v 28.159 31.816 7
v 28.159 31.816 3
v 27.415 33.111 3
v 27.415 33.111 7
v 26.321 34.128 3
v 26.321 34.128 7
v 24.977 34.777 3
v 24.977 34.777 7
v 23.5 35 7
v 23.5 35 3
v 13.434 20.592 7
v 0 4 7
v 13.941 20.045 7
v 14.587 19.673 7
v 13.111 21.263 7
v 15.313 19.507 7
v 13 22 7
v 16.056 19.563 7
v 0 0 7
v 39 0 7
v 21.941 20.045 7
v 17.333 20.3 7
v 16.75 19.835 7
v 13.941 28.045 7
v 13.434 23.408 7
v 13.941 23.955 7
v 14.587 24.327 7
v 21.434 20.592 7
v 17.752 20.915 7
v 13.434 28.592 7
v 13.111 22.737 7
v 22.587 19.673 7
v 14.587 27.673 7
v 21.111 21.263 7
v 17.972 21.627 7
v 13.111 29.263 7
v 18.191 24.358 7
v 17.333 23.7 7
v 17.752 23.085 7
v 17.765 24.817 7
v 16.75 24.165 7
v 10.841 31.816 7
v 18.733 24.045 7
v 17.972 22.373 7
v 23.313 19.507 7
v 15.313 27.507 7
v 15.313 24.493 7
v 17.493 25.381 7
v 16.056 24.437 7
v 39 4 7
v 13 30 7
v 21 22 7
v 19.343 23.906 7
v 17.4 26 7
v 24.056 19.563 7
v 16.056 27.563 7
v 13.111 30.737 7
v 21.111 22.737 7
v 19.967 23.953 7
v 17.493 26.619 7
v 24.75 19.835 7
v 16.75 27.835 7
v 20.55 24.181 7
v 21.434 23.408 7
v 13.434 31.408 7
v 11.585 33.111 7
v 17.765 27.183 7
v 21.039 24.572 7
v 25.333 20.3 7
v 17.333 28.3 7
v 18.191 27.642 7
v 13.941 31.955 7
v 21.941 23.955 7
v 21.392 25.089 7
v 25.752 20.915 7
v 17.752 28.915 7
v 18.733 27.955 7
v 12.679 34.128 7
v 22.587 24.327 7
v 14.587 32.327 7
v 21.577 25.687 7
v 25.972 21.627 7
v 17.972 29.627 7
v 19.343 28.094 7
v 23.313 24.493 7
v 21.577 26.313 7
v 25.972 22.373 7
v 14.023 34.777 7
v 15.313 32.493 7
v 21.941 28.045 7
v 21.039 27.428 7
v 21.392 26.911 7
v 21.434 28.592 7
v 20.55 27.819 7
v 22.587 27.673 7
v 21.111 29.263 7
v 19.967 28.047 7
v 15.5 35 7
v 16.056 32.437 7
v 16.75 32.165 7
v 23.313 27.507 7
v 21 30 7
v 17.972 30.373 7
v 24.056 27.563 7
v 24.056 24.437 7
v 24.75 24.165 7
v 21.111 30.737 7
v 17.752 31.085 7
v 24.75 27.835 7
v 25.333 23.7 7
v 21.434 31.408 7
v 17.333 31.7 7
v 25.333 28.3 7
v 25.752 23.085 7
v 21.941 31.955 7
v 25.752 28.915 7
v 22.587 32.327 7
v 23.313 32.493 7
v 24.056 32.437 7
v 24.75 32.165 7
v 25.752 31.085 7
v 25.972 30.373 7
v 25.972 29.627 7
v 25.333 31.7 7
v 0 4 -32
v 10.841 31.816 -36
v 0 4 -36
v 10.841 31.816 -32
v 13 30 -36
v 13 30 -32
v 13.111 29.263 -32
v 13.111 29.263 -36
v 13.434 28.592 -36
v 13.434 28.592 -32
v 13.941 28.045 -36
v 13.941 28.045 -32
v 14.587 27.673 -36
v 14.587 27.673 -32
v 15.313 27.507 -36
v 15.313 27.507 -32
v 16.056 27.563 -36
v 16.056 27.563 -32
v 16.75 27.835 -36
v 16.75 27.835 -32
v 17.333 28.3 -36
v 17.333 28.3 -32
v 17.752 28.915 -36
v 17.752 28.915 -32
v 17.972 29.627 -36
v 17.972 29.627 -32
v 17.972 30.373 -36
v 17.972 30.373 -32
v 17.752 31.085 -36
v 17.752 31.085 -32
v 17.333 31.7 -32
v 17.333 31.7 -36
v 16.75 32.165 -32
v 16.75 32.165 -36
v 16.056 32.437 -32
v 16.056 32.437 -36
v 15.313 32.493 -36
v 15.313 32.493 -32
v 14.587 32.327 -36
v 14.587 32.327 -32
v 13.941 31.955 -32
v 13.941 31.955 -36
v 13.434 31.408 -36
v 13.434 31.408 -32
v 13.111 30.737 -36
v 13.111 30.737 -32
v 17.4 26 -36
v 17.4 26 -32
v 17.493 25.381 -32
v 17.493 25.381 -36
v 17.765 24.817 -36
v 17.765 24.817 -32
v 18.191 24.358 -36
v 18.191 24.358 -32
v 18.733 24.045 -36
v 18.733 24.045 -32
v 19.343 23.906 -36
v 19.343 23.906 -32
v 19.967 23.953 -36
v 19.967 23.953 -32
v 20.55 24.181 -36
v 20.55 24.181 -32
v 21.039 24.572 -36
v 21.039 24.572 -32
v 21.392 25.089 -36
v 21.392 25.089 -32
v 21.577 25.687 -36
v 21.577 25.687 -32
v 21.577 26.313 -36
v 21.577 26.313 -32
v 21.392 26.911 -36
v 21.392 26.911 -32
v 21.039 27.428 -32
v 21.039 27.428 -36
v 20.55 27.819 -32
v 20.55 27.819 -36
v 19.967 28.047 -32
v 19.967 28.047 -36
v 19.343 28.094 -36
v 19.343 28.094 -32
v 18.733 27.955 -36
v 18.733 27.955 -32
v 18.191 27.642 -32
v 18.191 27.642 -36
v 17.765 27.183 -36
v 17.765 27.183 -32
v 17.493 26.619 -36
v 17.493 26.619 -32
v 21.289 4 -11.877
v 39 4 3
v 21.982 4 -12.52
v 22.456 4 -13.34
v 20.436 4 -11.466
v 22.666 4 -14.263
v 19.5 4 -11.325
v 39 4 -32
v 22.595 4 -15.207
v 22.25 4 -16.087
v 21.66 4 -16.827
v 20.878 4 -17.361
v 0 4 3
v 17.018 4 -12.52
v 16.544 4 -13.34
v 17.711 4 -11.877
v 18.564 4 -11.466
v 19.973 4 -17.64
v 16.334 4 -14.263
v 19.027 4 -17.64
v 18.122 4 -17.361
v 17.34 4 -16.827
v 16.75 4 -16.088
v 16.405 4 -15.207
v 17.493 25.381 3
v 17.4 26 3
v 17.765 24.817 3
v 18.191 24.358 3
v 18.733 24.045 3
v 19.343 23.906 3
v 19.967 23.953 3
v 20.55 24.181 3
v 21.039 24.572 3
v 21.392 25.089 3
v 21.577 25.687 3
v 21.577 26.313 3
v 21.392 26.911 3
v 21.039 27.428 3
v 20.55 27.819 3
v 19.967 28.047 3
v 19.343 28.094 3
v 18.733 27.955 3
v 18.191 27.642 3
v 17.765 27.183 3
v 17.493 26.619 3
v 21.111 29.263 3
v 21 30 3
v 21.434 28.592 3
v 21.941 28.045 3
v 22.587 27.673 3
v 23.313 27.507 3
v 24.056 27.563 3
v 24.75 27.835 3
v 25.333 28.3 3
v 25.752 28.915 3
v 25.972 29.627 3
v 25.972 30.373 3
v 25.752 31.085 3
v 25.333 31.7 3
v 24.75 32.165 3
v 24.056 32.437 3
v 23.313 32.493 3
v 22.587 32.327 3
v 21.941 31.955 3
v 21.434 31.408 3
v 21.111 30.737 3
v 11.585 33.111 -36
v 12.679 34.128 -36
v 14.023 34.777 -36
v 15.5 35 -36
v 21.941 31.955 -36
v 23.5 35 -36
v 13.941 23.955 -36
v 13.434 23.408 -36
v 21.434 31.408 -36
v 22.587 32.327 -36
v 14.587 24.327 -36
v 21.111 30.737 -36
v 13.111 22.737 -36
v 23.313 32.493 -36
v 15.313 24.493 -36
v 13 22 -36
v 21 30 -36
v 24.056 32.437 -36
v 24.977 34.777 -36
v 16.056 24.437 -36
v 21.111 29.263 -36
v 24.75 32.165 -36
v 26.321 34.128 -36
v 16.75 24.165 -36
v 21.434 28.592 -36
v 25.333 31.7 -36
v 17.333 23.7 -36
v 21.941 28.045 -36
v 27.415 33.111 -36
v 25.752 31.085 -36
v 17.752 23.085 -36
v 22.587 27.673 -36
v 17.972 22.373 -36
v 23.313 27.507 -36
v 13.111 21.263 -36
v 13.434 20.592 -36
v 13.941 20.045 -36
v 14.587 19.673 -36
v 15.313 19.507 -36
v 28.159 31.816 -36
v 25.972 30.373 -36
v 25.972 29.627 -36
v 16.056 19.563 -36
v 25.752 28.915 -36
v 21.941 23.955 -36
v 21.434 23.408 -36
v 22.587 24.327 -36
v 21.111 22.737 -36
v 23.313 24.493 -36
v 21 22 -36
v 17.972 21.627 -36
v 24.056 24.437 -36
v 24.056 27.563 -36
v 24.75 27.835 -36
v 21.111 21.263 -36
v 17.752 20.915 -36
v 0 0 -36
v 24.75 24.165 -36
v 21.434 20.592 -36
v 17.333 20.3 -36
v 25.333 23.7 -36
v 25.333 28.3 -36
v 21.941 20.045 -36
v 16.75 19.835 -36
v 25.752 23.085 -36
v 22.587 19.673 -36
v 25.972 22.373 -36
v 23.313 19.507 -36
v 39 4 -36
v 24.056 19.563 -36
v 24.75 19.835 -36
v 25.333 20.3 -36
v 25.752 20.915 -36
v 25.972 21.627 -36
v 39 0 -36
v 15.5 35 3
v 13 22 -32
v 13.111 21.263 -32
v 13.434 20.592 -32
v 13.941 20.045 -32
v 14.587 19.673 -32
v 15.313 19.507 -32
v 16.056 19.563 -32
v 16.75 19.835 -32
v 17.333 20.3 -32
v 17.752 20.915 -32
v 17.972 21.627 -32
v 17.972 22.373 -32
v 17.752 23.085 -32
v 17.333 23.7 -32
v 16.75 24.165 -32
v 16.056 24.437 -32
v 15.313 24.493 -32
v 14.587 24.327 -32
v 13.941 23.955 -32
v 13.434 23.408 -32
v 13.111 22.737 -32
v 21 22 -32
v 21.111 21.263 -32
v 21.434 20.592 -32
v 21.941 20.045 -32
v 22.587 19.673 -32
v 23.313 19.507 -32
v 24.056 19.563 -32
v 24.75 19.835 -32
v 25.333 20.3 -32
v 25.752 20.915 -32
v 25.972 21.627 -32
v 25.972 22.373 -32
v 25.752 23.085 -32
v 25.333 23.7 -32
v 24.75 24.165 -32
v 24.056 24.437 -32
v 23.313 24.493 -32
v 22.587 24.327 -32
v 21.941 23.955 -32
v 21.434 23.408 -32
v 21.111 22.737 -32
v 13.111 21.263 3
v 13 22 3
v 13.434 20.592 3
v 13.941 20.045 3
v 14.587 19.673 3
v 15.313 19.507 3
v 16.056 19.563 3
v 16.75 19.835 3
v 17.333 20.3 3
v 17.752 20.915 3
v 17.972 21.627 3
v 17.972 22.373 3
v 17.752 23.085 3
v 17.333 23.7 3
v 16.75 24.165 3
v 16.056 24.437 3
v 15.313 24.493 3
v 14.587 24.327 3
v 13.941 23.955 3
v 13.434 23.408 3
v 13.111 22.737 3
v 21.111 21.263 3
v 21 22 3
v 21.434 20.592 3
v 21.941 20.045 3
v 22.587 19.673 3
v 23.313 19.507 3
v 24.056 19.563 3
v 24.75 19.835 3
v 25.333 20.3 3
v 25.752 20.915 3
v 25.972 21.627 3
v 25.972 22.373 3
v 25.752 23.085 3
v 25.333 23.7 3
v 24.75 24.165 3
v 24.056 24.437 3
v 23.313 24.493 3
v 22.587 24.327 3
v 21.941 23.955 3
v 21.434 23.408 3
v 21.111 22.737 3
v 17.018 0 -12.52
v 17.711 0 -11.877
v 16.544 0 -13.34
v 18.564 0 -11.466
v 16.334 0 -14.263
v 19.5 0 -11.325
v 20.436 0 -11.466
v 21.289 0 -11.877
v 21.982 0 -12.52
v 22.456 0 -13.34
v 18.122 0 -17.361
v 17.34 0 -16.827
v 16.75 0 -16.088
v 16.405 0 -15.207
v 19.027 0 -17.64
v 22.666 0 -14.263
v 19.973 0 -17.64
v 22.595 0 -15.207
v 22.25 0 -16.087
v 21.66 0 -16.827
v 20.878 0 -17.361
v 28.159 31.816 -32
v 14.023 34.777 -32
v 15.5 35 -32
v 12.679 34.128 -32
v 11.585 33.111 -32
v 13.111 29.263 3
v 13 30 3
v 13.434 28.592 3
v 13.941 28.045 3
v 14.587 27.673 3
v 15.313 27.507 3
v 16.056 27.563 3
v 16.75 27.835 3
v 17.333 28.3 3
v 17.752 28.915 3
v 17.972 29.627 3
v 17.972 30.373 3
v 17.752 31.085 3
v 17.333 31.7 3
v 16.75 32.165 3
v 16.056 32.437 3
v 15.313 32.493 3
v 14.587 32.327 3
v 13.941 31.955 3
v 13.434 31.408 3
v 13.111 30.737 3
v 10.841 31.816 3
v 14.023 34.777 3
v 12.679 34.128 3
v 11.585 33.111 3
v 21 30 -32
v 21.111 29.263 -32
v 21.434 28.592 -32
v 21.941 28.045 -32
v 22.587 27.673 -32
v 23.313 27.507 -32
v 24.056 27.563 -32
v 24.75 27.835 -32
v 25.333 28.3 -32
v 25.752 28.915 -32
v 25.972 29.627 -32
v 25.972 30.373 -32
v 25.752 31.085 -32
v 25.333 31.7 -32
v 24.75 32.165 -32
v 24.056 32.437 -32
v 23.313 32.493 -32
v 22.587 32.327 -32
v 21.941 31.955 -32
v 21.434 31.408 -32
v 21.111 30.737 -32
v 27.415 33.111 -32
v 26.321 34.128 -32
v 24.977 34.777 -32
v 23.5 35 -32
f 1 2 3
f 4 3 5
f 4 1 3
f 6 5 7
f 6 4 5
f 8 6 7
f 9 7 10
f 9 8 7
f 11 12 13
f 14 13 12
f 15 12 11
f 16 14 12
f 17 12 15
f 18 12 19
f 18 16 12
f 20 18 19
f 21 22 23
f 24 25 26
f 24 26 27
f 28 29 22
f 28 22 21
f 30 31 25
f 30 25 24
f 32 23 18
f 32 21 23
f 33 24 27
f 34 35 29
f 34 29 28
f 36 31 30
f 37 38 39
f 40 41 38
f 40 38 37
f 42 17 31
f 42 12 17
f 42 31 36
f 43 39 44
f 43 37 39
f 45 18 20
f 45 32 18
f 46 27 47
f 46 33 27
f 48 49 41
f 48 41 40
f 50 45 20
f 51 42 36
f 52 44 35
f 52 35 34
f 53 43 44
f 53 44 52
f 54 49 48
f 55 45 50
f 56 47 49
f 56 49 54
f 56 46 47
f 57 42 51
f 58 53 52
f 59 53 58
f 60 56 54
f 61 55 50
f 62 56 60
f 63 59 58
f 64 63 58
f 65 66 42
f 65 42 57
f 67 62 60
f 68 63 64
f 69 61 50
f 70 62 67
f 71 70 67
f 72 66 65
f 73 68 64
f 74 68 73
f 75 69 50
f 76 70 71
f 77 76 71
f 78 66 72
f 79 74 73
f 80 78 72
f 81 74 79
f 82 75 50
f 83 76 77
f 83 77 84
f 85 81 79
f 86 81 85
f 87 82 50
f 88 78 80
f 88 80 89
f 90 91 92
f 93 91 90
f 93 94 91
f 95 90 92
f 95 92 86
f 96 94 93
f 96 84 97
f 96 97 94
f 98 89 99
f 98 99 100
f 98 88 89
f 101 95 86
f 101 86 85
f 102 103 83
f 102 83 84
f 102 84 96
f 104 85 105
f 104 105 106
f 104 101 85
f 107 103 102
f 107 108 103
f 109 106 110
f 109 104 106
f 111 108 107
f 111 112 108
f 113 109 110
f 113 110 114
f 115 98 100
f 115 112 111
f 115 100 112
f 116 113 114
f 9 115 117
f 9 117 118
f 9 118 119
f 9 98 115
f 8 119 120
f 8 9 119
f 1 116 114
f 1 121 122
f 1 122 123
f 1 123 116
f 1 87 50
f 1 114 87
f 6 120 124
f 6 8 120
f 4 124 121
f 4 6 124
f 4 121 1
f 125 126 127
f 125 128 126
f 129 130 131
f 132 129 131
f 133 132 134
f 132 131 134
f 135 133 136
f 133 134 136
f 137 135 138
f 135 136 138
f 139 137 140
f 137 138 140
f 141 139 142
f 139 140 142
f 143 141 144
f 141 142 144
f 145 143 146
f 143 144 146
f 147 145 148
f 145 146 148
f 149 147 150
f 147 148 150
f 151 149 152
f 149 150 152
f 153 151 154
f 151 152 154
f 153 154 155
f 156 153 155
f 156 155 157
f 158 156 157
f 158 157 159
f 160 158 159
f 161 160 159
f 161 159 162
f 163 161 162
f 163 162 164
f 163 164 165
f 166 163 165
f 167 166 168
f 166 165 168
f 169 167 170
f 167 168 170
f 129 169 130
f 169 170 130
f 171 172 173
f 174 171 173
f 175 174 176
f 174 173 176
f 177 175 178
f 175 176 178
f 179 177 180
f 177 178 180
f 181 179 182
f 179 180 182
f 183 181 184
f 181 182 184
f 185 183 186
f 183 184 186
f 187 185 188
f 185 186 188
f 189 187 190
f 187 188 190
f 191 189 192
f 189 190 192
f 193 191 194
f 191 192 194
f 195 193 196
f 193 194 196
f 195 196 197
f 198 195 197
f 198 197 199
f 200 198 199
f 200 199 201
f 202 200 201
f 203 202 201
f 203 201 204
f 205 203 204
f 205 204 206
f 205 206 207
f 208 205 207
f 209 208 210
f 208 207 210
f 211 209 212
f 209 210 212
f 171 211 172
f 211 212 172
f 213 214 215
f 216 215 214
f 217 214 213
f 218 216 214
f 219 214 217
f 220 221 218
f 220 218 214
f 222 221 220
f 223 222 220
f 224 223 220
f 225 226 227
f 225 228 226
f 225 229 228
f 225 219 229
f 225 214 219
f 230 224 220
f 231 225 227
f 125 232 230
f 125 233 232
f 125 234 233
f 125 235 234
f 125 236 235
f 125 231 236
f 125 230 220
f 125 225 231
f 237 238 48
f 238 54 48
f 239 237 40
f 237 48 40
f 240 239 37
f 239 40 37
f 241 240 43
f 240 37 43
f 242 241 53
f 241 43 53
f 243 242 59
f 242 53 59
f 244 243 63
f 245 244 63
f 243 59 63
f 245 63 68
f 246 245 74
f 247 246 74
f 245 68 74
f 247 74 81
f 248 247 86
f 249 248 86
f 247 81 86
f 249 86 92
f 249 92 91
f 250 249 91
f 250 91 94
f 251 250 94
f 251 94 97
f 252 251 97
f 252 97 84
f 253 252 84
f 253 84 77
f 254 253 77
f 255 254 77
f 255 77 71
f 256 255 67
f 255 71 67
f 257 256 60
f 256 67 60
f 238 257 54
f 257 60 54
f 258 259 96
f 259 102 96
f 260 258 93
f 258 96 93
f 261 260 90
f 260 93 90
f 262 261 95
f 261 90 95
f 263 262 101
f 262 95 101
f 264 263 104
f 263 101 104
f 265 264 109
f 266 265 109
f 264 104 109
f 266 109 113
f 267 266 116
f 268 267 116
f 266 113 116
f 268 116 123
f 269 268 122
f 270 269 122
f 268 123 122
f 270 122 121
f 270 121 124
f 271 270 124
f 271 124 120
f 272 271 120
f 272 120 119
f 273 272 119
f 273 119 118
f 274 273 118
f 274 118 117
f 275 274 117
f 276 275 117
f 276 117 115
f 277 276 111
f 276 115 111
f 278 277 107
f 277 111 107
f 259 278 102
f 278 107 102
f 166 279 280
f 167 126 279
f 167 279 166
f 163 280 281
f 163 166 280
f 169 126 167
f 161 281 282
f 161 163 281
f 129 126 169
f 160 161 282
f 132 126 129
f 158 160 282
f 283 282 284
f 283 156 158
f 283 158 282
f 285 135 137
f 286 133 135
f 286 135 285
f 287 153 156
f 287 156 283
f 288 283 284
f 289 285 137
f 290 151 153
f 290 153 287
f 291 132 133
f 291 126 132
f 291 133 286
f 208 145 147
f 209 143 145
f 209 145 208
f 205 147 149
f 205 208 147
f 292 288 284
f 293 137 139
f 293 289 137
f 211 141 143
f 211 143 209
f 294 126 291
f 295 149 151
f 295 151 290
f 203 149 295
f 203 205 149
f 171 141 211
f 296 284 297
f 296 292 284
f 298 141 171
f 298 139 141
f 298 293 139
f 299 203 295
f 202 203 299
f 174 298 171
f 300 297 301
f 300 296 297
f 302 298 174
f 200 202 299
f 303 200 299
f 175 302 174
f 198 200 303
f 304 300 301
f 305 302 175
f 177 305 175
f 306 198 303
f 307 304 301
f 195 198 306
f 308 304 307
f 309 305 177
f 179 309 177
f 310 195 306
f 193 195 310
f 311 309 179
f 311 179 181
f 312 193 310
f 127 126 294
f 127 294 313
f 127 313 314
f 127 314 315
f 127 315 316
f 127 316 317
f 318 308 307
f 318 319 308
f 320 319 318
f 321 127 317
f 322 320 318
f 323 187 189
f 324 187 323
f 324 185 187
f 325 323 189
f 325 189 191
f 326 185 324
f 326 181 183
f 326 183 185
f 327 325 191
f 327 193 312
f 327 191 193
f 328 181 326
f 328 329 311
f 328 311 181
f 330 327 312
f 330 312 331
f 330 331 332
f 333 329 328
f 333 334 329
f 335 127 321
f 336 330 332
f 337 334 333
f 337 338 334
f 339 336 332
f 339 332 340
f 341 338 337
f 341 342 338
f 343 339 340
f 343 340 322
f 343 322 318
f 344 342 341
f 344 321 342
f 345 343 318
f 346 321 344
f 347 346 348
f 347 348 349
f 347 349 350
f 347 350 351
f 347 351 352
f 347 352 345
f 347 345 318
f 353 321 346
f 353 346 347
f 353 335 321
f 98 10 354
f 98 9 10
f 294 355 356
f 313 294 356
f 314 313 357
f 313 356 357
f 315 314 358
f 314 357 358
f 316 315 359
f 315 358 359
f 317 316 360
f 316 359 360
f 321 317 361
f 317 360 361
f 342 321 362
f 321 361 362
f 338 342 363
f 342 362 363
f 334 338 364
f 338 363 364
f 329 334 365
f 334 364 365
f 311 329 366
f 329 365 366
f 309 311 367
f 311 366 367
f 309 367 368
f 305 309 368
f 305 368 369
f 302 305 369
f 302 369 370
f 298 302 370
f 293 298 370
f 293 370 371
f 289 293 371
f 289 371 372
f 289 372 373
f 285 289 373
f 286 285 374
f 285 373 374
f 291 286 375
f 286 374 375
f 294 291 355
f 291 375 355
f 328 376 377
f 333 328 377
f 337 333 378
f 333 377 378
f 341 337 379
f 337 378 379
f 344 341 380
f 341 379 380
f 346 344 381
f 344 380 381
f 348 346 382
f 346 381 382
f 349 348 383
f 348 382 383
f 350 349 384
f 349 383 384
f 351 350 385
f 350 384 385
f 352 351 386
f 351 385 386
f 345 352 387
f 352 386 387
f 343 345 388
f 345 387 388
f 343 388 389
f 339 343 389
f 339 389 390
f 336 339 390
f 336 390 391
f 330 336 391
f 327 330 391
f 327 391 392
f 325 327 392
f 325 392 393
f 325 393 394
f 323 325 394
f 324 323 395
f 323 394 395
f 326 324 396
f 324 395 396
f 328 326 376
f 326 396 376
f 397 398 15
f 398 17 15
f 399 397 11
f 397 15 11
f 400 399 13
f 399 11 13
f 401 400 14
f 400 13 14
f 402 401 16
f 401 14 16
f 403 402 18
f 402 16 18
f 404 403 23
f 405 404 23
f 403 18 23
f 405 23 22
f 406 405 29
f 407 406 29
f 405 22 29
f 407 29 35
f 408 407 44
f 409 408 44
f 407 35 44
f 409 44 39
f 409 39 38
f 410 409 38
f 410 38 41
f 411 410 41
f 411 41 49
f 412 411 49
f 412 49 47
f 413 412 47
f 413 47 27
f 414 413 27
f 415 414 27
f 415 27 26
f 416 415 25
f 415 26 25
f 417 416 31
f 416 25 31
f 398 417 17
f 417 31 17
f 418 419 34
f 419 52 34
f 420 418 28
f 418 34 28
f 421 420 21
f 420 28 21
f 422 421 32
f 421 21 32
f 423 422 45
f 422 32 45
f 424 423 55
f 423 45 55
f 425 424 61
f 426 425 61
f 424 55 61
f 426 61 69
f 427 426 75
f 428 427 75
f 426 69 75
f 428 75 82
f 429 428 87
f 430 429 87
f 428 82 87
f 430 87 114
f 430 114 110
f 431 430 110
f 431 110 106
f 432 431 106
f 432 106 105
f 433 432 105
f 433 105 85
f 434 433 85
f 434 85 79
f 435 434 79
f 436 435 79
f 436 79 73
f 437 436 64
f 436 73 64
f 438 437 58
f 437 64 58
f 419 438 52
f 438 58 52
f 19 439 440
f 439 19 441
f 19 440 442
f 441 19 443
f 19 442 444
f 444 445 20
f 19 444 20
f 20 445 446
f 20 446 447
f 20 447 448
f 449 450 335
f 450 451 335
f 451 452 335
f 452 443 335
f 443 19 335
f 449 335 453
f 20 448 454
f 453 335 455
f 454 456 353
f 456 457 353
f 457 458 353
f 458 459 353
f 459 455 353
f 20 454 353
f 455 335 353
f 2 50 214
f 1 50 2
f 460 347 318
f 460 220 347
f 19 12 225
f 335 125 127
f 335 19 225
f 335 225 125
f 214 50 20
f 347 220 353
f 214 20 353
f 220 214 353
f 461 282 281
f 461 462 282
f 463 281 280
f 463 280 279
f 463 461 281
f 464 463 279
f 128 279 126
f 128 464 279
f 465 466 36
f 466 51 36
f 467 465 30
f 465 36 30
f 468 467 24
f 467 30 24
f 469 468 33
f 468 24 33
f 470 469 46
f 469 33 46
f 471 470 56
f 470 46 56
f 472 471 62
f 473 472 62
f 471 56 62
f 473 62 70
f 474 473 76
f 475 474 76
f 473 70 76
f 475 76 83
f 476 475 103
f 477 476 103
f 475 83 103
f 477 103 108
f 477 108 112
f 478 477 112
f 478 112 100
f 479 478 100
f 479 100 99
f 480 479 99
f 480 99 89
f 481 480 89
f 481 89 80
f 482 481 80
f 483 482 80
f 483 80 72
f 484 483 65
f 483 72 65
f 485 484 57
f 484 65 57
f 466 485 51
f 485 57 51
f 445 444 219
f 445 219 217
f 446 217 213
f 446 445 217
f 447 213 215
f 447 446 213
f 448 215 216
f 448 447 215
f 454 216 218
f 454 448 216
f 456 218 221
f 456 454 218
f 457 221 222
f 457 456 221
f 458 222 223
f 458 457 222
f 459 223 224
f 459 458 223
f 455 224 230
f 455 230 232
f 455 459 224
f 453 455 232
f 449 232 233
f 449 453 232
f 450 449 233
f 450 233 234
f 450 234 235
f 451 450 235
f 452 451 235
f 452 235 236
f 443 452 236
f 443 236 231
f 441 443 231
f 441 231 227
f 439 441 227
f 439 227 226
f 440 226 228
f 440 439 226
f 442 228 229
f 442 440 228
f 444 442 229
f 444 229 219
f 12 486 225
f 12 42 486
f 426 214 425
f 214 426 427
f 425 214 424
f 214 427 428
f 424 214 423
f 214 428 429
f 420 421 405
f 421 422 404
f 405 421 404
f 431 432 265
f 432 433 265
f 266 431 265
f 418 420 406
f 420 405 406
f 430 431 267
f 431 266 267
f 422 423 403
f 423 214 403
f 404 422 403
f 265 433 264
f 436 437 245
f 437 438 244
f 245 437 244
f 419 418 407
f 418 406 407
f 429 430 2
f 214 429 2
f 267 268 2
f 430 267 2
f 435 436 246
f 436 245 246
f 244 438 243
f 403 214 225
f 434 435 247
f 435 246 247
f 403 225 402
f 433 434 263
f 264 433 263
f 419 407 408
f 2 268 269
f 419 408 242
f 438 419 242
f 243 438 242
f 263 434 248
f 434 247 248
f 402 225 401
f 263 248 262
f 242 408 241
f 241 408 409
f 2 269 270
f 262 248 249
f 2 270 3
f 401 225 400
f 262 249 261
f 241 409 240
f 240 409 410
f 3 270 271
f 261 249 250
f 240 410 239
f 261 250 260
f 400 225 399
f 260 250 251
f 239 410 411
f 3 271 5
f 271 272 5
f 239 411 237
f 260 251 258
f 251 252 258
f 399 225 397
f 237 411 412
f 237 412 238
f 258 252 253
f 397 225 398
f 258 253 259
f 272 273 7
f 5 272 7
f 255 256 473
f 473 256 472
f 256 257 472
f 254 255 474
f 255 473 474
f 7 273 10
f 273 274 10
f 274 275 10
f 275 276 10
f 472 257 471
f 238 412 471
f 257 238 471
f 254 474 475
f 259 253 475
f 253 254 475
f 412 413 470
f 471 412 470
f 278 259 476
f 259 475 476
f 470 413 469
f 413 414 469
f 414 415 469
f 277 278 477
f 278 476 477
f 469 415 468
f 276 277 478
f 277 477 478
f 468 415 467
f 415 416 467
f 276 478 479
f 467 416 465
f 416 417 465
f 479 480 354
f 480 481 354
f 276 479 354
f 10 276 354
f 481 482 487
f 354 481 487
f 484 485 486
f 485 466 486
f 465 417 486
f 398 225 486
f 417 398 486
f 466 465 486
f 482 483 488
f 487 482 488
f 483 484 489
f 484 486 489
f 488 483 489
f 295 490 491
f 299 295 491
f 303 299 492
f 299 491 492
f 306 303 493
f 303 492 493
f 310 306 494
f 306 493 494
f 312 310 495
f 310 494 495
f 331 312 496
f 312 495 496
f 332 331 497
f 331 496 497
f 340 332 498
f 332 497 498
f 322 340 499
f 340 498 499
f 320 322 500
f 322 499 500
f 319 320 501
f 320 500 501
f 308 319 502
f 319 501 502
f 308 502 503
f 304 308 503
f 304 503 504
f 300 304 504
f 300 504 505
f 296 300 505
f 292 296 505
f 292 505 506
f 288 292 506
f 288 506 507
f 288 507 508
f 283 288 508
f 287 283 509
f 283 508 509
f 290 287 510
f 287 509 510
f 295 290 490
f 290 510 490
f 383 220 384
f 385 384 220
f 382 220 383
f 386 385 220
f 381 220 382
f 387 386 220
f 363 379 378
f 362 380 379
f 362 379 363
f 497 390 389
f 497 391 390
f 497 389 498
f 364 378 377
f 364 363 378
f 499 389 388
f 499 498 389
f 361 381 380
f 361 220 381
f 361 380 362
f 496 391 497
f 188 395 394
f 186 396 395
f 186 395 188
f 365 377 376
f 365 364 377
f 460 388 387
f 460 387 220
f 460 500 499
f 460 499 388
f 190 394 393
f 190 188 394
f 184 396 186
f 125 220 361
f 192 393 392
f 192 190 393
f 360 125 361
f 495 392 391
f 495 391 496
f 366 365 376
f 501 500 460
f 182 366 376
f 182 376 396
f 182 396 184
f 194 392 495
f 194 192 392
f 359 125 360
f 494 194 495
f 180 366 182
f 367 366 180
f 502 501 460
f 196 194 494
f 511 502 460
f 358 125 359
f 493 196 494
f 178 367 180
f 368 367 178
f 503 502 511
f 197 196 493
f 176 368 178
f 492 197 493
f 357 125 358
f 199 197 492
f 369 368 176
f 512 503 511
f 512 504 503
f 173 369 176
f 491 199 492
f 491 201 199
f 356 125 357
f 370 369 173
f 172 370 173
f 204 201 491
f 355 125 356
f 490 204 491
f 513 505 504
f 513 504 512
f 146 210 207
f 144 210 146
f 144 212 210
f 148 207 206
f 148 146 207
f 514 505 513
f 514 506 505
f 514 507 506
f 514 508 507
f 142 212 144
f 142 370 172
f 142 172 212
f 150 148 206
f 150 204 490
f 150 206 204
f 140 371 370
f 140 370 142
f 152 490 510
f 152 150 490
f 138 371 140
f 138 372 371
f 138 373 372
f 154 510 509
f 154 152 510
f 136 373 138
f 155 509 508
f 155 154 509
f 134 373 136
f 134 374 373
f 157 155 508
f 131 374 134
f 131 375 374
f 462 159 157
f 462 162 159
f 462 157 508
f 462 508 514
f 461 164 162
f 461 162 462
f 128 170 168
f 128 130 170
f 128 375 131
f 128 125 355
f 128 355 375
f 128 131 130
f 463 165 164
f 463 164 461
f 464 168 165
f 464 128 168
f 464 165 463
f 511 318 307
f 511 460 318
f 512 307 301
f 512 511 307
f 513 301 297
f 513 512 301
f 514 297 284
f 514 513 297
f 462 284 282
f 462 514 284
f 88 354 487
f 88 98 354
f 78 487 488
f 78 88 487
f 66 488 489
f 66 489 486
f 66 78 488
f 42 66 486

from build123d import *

# Parameters (mm, degrees)
SKETCH2_W                       = 39
SKETCH2_H                       = 43
SKETCH2_R                       = 3.175
BOSS_EXTRUDE1_DEPTH             = 4
BOSS_EXTRUDE2_REACH             = 55.226
SKETCH3_R                       = 2.5
SKETCH3_R_2                     = 2.1
BOSS_EXTRUDE2_DIRECTION_2_REACH = 55.226
SKETCH5_W                       = 35
SKETCH5_H                       = 44.559224728
CUT_EXTRUDE2_DEPTH              = 64.576725301


with BuildPart() as part:
    # Sketch2 → Boss-Extrude1 (new body)
    with BuildSketch(Plane(origin=(0, 0, 0), x_dir=(1, 0, 0), z_dir=(0, 1, 0))):
        with Locations((19.5, 14.5)):
            Rectangle(SKETCH2_W, SKETCH2_H)
        with Locations(Location((19.5, 14.5, 0), (0, 0, 270))):
            Circle(SKETCH2_R, mode=Mode.SUBTRACT)
    extrude(amount=BOSS_EXTRUDE1_DEPTH)

    # Boss-Extrude2: up to this face of the body (flat: up to its plane)
    boss_extrude2_end = Plane(part.part.faces().sort_by_distance((19.5, 2, 7))[0])
    # Sketch3 → Boss-Extrude2 (add, up to the picked face)
    with BuildSketch(Plane.XY, mode=Mode.PRIVATE) as boss_extrude2_sk1:
        with BuildLine():
            Line((39, 4), (28.158657967, 31.815738403))
            ThreePointArc((28.158657967, 31.815738403), (26.321463094, 34.127874272), (23.5, 35))
            Line((23.5, 35), (15.5, 35))
            ThreePointArc((15.5, 35), (12.678536906, 34.127874272), (10.841342033, 31.815738403))
            Line((10.841342033, 31.815738403), (0, 4))
            Line((0, 4), (39, 4))
        make_face()
        with Locations(Location((15.5, 30, 0), (0, 0, 180))):
            Circle(SKETCH3_R, mode=Mode.SUBTRACT)
        with Locations(Location((23.5, 30, 0), (0, 0, 180))):
            Circle(SKETCH3_R, mode=Mode.SUBTRACT)
        with Locations(Location((23.5, 22, 0), (0, 0, 180))):
            Circle(SKETCH3_R, mode=Mode.SUBTRACT)
        with Locations(Location((15.5, 22, 0), (0, 0, 180))):
            Circle(SKETCH3_R, mode=Mode.SUBTRACT)
        with Locations(Location((19.5, 26, 0), (0, 0, 180))):
            Circle(SKETCH3_R_2, mode=Mode.SUBTRACT)
    boss_extrude2_tool1 = split(extrude(boss_extrude2_sk1.sketch, amount=BOSS_EXTRUDE2_REACH, mode=Mode.PRIVATE), bisect_by=boss_extrude2_end, keep=Keep.BOTH, mode=Mode.PRIVATE)
    add(boss_extrude2_tool1.solids().sort_by(Axis((19.5, 15.979018, 0), (0, 0, 1)))[0])

    # Boss-Extrude2 direction 2: up to this face of the body (flat: up to its plane)
    boss_extrude2_direction_2_end = Plane(part.part.faces().sort_by_distance((19.5, 2, -36))[0])
    # Sketch3 → Boss-Extrude2 direction 2 (add, up to the picked face)
    with BuildSketch(Plane.XY, mode=Mode.PRIVATE) as boss_extrude2_direction_2_sk1:
        with BuildLine():
            Line((39, 4), (28.158657967, 31.815738403))
            ThreePointArc((28.158657967, 31.815738403), (26.321463094, 34.127874272), (23.5, 35))
            Line((23.5, 35), (15.5, 35))
            ThreePointArc((15.5, 35), (12.678536906, 34.127874272), (10.841342033, 31.815738403))
            Line((10.841342033, 31.815738403), (0, 4))
            Line((0, 4), (39, 4))
        make_face()
        with Locations(Location((15.5, 30, 0), (0, 0, 180))):
            Circle(SKETCH3_R, mode=Mode.SUBTRACT)
        with Locations(Location((23.5, 30, 0), (0, 0, 180))):
            Circle(SKETCH3_R, mode=Mode.SUBTRACT)
        with Locations(Location((23.5, 22, 0), (0, 0, 180))):
            Circle(SKETCH3_R, mode=Mode.SUBTRACT)
        with Locations(Location((15.5, 22, 0), (0, 0, 180))):
            Circle(SKETCH3_R, mode=Mode.SUBTRACT)
        with Locations(Location((19.5, 26, 0), (0, 0, 180))):
            Circle(SKETCH3_R_2, mode=Mode.SUBTRACT)
    boss_extrude2_direction_2_tool1 = split(extrude(boss_extrude2_direction_2_sk1.sketch, amount=-BOSS_EXTRUDE2_DIRECTION_2_REACH, mode=Mode.PRIVATE), bisect_by=boss_extrude2_direction_2_end, keep=Keep.BOTH, mode=Mode.PRIVATE)
    add(boss_extrude2_direction_2_tool1.solids().sort_by(Axis((19.5, 15.979018, 0), (0, 0, -1)))[0])

    # Sketch5 → Cut-Extrude2 (cut, through all)
    with BuildSketch(Plane(origin=(0, 0, 0), x_dir=(0, 0, -1), z_dir=(1, 0, 0))):
        with Locations((14.5, 26.279612364)):
            Rectangle(SKETCH5_W, SKETCH5_H)
    extrude(amount=CUT_EXTRUDE2_DEPTH, mode=Mode.SUBTRACT)


solid = part.part
